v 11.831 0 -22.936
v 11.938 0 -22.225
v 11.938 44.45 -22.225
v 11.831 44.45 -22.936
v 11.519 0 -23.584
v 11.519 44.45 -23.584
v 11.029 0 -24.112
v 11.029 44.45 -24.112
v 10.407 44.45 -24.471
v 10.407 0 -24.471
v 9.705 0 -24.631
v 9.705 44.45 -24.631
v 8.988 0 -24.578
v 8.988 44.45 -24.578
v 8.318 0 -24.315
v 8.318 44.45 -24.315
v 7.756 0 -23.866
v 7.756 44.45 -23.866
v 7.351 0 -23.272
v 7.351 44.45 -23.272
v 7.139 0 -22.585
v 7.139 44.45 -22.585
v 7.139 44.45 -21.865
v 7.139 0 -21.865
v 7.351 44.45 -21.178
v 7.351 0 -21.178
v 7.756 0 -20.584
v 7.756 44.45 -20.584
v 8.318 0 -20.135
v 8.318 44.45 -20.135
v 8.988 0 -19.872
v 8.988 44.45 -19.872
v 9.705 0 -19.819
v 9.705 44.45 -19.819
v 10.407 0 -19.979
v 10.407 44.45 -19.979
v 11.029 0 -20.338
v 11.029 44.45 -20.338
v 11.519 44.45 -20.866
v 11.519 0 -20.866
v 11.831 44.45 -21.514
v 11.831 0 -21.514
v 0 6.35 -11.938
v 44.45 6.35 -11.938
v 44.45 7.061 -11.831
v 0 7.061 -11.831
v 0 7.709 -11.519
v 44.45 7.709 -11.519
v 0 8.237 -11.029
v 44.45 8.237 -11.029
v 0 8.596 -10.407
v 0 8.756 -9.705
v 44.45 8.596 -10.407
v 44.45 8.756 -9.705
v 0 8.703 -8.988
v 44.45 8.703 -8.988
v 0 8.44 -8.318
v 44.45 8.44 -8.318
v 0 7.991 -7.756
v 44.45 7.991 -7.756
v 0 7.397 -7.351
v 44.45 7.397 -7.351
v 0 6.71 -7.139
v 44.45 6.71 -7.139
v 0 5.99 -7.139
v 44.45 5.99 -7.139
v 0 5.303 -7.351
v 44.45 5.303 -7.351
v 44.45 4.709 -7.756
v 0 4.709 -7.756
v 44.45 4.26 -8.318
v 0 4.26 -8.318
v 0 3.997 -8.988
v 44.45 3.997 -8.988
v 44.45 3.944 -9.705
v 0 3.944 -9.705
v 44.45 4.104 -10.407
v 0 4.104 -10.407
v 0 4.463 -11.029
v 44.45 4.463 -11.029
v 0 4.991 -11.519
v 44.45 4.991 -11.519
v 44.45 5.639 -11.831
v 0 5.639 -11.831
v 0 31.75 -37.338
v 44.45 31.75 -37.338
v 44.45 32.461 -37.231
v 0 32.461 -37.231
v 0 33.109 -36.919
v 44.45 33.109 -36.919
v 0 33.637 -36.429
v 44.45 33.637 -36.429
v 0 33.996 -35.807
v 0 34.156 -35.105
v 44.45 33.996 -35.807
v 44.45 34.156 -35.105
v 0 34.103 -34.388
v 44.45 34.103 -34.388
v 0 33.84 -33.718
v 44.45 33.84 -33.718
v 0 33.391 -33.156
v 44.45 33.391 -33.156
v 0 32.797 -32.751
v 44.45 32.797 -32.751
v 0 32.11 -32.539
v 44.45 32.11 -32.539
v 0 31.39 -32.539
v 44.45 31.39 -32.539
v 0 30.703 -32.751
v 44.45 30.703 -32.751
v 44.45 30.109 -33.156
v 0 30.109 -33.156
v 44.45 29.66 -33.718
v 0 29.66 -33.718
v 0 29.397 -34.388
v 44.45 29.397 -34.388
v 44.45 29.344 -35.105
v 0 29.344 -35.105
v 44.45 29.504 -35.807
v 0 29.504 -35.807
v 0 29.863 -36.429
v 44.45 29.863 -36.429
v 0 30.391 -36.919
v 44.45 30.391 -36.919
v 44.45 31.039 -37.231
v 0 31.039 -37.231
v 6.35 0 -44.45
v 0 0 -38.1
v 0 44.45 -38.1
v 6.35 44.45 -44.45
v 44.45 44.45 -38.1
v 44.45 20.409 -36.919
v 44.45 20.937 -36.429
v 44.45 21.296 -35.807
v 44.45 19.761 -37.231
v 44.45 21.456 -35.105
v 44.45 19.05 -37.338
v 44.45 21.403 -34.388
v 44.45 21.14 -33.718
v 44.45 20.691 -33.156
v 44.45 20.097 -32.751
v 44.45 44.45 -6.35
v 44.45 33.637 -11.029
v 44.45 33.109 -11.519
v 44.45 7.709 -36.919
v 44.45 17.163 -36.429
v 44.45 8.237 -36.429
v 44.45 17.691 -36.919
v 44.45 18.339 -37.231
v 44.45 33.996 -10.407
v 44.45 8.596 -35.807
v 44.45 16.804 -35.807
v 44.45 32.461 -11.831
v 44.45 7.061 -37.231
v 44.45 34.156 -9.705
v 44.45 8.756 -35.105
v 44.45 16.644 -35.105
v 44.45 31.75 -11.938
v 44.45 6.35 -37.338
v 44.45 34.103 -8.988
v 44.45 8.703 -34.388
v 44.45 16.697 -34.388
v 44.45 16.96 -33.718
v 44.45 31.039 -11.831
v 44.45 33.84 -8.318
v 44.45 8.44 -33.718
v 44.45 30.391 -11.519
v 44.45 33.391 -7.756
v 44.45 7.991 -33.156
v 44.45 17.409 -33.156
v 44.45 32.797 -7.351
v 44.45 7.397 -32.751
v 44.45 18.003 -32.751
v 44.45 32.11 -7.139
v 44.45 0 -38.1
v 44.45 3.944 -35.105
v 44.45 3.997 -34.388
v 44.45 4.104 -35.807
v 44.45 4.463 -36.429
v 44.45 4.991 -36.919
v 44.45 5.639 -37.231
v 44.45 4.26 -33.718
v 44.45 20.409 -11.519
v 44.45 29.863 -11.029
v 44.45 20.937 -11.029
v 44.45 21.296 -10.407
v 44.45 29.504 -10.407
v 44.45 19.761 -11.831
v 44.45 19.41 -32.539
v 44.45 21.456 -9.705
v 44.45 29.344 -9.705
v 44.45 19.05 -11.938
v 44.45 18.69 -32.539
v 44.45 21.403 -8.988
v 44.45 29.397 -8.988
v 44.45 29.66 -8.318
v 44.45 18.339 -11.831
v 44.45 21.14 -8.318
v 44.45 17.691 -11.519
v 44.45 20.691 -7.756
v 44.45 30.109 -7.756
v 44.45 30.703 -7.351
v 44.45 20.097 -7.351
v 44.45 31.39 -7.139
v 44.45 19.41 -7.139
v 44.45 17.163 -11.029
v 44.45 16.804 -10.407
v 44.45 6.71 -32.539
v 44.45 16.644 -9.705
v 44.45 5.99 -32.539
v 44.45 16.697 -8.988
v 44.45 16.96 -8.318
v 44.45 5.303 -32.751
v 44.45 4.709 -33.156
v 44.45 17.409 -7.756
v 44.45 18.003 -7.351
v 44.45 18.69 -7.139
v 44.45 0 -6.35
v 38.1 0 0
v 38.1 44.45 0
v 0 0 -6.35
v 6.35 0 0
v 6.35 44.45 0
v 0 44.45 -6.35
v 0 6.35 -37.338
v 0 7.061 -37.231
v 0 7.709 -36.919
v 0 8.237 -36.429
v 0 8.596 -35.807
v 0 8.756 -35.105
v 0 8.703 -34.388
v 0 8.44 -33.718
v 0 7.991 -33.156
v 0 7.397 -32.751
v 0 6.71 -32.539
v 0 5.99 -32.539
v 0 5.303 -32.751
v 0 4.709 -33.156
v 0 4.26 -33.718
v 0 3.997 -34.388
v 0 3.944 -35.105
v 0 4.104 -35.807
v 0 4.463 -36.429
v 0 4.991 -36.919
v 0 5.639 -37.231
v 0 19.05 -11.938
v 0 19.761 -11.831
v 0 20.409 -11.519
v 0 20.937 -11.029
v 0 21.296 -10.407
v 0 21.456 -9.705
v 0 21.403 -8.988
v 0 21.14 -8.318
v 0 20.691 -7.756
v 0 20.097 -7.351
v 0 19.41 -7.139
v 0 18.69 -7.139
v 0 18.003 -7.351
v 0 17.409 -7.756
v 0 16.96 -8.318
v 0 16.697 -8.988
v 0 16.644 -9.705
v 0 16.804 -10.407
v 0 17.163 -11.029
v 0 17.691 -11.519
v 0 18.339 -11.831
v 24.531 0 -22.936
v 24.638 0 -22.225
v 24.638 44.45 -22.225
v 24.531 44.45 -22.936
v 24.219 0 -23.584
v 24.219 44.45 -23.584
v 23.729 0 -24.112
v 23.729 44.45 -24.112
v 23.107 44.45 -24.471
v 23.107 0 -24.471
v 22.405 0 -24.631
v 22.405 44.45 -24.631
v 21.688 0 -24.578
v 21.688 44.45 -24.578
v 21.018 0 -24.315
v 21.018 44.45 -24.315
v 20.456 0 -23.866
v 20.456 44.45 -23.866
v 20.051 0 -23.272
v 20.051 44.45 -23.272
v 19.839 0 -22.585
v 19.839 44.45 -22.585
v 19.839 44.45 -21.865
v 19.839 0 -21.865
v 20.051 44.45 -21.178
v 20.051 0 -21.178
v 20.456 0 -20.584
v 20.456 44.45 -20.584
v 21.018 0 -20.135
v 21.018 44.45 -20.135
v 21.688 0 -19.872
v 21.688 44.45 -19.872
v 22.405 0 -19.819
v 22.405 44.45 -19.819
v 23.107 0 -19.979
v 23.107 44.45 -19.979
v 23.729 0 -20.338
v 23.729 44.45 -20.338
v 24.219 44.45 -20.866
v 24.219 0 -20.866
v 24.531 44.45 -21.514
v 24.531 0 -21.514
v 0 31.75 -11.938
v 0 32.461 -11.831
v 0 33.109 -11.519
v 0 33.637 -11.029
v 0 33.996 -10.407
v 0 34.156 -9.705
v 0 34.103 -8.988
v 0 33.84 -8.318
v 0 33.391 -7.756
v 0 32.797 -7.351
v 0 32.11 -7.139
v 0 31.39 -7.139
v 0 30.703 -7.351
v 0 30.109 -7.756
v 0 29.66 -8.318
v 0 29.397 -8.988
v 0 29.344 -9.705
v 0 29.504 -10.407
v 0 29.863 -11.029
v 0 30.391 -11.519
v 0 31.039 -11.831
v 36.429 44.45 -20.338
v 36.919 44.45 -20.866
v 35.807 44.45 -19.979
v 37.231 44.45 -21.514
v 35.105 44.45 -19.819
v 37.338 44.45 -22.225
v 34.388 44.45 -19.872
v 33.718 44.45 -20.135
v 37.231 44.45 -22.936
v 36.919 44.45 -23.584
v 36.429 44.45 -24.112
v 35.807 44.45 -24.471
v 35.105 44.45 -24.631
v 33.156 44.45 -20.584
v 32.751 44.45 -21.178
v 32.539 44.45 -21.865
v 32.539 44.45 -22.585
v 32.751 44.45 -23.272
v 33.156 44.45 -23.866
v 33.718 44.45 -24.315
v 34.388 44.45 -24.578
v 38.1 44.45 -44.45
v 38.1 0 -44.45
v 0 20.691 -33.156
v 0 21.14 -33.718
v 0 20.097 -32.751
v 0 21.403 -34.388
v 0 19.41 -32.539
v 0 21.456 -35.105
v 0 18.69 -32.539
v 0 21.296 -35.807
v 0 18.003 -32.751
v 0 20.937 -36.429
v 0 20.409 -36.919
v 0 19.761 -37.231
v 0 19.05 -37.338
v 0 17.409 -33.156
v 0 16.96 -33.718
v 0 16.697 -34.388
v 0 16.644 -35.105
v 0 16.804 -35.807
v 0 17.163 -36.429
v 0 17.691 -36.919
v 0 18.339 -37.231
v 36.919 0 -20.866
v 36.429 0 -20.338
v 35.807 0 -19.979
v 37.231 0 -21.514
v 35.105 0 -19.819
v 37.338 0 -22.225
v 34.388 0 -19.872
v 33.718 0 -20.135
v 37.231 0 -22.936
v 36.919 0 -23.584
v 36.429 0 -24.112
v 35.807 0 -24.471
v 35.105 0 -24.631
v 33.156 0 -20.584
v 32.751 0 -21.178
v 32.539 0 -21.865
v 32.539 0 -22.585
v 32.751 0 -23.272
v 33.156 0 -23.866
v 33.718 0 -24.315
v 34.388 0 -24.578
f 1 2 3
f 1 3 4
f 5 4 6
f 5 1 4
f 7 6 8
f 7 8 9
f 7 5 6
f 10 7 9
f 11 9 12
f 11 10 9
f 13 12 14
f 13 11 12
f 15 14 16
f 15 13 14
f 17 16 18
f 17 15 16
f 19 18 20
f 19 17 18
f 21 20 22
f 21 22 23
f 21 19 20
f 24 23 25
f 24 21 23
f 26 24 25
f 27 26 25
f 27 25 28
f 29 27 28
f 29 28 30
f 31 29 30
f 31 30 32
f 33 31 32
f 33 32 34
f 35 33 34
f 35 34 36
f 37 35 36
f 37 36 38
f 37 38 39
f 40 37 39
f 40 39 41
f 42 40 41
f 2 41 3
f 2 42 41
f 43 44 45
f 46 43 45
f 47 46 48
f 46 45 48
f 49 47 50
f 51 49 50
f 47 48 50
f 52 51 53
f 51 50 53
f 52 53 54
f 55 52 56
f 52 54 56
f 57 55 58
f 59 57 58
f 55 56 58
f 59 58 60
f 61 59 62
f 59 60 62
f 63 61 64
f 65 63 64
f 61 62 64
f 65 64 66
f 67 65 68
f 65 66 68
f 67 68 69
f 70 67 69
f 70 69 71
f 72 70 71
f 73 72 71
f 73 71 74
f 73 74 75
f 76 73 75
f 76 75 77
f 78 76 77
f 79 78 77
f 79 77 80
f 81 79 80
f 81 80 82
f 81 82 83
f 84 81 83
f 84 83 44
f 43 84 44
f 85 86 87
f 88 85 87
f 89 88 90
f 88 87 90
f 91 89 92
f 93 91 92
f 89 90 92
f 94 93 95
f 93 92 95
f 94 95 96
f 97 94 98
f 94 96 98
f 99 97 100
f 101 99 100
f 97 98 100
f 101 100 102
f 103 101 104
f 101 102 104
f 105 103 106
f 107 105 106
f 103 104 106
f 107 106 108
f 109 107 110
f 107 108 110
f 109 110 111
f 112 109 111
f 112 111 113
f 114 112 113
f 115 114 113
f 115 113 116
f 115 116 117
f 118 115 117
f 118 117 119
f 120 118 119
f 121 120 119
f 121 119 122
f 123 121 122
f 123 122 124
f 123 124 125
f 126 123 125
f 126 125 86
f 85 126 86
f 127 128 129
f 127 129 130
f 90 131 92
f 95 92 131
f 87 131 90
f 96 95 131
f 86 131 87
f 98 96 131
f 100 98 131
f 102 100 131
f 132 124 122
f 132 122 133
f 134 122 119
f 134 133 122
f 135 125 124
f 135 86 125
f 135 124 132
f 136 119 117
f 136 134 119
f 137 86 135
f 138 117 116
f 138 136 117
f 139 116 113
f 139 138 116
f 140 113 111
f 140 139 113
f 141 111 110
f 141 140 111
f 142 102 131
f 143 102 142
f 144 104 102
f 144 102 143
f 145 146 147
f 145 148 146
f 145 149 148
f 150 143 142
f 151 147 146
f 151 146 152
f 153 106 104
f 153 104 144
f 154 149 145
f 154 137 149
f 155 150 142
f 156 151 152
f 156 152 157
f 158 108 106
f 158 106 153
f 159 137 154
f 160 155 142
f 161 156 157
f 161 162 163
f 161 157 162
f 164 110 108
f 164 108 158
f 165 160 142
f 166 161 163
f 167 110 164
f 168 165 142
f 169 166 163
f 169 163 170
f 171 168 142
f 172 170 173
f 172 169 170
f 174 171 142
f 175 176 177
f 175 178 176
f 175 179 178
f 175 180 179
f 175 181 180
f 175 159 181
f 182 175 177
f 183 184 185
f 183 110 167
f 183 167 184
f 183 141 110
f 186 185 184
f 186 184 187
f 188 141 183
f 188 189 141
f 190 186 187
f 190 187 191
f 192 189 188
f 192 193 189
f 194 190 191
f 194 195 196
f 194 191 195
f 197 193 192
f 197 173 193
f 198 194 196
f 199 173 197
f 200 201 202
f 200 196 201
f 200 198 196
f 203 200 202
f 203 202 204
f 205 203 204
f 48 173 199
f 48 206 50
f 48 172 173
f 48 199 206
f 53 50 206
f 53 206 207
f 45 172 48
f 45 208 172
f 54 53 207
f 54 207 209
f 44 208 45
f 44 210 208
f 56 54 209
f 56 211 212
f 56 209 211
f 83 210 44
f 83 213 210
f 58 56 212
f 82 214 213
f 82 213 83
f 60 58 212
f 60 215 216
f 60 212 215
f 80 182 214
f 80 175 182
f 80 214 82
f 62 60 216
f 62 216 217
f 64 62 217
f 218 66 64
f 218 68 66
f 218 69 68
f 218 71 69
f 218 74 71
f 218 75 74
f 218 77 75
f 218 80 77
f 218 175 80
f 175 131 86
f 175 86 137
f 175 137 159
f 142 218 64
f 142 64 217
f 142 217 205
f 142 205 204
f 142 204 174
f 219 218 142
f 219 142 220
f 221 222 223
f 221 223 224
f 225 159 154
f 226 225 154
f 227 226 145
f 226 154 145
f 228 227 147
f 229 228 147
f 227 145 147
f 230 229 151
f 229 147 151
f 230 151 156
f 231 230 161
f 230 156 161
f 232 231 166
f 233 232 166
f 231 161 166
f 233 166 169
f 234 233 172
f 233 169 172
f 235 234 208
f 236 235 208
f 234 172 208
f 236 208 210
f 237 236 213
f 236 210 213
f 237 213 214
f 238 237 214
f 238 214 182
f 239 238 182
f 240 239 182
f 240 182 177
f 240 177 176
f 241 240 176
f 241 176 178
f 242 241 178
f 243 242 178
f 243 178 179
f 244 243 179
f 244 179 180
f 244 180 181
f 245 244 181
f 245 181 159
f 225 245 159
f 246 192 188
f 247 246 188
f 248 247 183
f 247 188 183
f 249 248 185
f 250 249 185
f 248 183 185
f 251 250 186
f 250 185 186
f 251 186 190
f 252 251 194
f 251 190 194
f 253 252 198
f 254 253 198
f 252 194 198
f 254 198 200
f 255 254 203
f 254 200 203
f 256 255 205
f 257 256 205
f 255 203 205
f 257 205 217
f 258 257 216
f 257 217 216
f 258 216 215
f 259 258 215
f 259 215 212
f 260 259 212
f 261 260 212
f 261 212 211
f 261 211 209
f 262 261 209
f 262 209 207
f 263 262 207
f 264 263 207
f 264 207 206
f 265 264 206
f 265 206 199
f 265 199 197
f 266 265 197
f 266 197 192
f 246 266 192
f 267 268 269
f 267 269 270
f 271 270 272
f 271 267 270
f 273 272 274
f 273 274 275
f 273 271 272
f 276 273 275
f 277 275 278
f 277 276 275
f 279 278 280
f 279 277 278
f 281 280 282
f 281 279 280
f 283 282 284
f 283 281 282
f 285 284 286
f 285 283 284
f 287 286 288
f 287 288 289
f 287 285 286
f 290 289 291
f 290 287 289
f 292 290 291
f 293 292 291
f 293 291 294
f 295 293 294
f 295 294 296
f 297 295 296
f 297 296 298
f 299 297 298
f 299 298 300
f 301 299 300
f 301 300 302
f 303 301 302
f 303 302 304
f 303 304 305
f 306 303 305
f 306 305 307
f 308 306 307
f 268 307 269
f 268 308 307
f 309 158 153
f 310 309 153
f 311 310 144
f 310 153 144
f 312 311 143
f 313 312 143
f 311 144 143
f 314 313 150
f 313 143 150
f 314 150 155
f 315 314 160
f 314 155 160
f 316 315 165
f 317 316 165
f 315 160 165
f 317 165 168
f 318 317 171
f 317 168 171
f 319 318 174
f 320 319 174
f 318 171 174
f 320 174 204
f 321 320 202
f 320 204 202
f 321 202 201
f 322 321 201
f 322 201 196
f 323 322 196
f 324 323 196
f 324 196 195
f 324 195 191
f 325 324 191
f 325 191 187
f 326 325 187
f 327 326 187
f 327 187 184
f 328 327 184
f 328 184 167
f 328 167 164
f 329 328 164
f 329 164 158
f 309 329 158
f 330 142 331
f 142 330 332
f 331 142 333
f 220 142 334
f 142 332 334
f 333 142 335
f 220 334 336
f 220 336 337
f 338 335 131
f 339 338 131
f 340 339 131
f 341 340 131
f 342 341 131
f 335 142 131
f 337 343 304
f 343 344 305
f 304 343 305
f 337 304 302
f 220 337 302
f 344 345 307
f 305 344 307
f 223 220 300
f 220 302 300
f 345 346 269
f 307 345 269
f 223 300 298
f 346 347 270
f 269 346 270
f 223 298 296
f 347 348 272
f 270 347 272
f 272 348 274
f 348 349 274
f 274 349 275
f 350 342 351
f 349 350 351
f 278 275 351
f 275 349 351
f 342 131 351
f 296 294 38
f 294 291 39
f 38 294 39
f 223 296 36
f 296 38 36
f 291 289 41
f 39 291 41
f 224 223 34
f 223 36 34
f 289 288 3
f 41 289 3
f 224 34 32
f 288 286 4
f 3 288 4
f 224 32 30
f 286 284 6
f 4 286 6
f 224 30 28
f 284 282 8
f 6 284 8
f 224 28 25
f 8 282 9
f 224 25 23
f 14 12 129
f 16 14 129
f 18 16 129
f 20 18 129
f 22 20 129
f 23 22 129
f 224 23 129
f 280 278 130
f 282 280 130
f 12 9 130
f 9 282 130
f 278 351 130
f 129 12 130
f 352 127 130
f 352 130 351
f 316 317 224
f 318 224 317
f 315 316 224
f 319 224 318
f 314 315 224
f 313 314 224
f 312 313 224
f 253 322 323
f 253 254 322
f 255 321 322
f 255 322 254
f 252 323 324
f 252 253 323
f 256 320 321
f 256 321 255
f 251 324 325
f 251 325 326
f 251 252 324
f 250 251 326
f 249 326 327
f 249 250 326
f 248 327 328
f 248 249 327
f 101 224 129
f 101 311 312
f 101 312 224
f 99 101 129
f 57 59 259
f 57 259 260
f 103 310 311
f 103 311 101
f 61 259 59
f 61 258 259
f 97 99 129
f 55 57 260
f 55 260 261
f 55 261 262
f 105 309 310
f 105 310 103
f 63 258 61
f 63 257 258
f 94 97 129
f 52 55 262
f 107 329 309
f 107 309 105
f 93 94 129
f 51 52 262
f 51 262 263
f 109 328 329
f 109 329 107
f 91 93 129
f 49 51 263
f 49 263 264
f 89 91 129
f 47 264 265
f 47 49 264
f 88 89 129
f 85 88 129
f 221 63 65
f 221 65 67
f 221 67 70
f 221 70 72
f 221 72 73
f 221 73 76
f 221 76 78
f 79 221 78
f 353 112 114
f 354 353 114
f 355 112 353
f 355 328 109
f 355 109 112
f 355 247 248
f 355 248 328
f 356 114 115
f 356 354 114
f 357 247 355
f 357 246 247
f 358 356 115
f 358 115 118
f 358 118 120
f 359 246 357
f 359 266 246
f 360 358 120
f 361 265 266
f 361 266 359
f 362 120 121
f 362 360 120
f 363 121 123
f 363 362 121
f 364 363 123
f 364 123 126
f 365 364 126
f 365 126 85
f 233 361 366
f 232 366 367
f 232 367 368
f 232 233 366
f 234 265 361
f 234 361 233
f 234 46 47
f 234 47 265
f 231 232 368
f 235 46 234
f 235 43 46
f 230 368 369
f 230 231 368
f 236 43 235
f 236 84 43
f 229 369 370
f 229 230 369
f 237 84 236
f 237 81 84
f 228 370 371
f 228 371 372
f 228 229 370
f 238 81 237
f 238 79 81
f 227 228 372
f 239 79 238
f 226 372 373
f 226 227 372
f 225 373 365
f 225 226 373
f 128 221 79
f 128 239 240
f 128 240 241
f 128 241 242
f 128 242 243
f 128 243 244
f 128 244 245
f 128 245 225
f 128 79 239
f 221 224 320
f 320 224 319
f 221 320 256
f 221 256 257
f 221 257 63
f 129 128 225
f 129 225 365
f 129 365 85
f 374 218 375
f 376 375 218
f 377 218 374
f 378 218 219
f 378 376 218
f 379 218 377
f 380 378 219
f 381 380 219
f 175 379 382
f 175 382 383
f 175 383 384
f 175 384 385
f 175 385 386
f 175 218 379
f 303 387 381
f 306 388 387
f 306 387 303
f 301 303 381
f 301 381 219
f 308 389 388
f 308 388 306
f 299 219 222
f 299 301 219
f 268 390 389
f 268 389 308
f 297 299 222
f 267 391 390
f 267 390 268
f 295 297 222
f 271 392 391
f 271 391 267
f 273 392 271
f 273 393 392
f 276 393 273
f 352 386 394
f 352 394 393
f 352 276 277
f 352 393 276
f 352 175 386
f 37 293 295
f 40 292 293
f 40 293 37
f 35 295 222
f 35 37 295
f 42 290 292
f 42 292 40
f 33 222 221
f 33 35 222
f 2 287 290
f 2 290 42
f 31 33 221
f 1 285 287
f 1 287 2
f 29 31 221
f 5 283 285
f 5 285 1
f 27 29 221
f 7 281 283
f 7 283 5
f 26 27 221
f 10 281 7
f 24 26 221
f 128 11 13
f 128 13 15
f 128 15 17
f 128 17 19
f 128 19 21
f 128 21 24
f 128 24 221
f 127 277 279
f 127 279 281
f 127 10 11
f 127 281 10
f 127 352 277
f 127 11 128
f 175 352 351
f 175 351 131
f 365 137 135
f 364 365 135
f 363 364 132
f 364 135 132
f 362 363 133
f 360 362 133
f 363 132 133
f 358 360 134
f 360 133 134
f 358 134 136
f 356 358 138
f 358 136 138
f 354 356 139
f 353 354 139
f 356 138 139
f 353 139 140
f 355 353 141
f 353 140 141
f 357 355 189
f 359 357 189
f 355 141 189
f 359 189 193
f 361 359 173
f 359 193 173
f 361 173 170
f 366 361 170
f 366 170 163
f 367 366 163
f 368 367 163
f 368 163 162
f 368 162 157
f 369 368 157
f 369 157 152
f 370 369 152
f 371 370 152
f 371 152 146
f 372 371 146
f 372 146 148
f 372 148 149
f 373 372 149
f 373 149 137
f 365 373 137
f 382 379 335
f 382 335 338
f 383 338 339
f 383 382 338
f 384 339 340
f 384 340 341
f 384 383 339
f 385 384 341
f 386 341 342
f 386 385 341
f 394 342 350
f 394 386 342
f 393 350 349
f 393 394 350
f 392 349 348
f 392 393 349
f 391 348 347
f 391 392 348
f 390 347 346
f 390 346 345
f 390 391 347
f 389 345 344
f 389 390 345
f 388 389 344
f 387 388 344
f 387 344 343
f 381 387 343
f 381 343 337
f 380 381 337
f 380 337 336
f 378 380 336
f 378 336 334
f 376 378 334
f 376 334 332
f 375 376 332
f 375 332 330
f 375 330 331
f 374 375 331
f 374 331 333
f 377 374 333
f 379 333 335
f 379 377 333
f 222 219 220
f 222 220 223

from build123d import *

# Parameters (mm, degrees)
SKETCH1_R           = 2.413
BOSS_EXTRUDE1_DEPTH = 44.45
SKETCH2_R           = 2.413
CUT_EXTRUDE1_DEPTH  = 50.8


with BuildPart() as part:
    # Sketch1 → Boss-Extrude1 (new body)
    with BuildSketch(Plane(origin=(0, 0, 0), x_dir=(1, 0, 0), z_dir=(0, 1, 0))):
        Polygon((0, 38.1), (6.35, 44.45), (38.1, 44.45), (44.45, 38.1), (44.45, 6.35), (38.1, 0), (6.35, 0), (0, 6.35), align=None)
        with Locations((9.525, 22.225)):
            Circle(SKETCH1_R, mode=Mode.SUBTRACT)
        with Locations((22.225, 22.225)):
            Circle(SKETCH1_R, mode=Mode.SUBTRACT)
        with Locations((34.925, 22.225)):
            Circle(SKETCH1_R, mode=Mode.SUBTRACT)
    extrude(amount=BOSS_EXTRUDE1_DEPTH)

    # Sketch2 → Cut-Extrude1 (cut)
    with BuildSketch(Plane(origin=(44.45, 0, 0), x_dir=(0, 0, -1), z_dir=(1, 0, 0))):
        with Locations((9.525, 31.75)):
            Circle(SKETCH2_R)
        with Locations((34.925, 31.75)):
            Circle(SKETCH2_R)
        with Locations((34.925, 6.35)):
            Circle(SKETCH2_R)
        with Locations((9.525, 6.35)):
            Circle(SKETCH2_R)
        with Locations((9.525, 19.05)):
            Circle(SKETCH2_R)
        with Locations((34.925, 19.05)):
            Circle(SKETCH2_R)
    extrude(amount=-CUT_EXTRUDE1_DEPTH, mode=Mode.SUBTRACT)


solid = part.part
